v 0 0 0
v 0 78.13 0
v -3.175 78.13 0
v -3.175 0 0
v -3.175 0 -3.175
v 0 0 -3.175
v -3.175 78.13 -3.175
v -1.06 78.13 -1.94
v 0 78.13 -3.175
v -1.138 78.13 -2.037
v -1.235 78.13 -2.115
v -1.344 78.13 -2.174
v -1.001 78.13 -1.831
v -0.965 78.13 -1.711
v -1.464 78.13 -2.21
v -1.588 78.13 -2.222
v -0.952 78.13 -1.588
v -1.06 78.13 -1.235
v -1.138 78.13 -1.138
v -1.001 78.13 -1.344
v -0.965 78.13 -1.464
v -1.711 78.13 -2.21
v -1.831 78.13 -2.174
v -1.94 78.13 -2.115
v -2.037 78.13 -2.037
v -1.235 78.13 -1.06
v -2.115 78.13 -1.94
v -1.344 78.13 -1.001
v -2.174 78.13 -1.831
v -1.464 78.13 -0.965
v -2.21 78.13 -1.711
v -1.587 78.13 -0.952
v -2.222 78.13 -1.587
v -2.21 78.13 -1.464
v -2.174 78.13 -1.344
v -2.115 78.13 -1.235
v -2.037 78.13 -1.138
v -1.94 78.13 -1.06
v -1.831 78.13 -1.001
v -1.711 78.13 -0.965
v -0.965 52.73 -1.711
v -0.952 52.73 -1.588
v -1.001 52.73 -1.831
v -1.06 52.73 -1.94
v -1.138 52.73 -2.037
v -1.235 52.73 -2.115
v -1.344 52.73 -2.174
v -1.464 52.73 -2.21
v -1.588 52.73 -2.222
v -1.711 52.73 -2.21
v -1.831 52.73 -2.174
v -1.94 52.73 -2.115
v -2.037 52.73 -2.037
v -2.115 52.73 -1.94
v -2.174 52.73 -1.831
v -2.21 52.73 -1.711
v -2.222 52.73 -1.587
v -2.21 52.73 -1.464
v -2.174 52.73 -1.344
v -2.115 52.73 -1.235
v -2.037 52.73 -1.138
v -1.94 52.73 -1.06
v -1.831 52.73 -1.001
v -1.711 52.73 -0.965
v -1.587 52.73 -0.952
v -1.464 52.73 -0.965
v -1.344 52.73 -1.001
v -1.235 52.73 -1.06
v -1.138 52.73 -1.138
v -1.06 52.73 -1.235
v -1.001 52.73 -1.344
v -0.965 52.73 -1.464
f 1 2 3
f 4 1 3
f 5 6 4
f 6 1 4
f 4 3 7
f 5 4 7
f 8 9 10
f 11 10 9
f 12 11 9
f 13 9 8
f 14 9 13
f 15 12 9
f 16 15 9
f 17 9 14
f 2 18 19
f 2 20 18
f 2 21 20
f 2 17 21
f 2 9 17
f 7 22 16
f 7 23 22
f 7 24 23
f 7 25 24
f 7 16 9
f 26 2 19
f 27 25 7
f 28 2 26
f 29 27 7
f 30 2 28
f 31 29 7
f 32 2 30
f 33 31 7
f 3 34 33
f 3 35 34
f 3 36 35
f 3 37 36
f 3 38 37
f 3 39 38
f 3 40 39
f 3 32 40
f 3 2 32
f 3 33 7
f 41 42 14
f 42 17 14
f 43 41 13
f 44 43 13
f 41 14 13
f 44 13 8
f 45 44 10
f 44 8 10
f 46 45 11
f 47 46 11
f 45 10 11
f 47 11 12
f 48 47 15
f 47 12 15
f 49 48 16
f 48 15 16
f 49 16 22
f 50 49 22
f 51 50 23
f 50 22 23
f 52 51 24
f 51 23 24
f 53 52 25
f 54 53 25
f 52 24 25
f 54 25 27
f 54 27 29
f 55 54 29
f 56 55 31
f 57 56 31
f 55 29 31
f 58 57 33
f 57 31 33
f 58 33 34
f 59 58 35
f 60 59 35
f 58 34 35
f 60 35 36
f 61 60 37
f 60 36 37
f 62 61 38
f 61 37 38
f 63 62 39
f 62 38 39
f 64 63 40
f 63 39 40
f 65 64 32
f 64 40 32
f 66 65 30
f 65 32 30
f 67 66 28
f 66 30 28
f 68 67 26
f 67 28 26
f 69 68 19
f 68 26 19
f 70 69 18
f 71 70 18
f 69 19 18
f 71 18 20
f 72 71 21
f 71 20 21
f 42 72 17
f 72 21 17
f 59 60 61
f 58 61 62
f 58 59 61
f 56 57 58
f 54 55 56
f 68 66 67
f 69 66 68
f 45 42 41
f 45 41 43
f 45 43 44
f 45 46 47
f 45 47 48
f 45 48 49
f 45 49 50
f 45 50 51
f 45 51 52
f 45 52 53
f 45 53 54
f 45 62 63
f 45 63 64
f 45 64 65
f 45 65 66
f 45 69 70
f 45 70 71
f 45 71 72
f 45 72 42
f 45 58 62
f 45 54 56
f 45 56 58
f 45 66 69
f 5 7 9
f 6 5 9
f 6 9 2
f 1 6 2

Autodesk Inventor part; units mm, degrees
ref_plane "YZ Plane" through (0, 0, 0) normal (1, 0, 0) x (0, 1, 0)
ref_plane "XZ Plane" through (0, 0, 0) normal (0, 1, 0) x (-1, 0, 0)
ref_plane "XY Plane" through (0, 0, 0) normal (0, 0, 1) x (1, 0, 0)
sketch "Sketch1" plane through (0, 0, 0) normal (0, 1, 0) x (-1, 0, 0)
  line L0 (0, 0) -> (3.175, 0)
  line L1 (3.175, 0) -> (3.175, -3.175)
  line L2 (3.175, -3.175) -> (0, -3.175)
  line L3 (0, -3.175) -> (0, 0)
  point P0 (0, -1.5875)
  point P1 (3.175, -1.5875)
  dimension "d2" = 3.175
  dimension "d3" = 3.175
extrude "Extrusion1" add sketch "Sketch1" along normal blind 78.1304
sketch "Sketch2" plane through (0, 78.1304, 0) normal (0, 1, 0) x (1, 0, 0)
  circle A0 centre (-1.5875, 1.5875) radius 0.635
  line L0 (0, 3.175) -> (-3.175, 3.175) construction
  line L1 (-3.175, 3.175) -> (0, 0) construction
  line L2 (-3.175, 3.175) -> (-3.175, 0) construction
  line L3 (0, 3.175) -> (-3.175, 0) construction
  dimension "d4" = 1.27
extrude "Extrusion2" cut sketch "Sketch2" against normal blind 25.4
properties part number "shaft" material "Aluminum 6061"
